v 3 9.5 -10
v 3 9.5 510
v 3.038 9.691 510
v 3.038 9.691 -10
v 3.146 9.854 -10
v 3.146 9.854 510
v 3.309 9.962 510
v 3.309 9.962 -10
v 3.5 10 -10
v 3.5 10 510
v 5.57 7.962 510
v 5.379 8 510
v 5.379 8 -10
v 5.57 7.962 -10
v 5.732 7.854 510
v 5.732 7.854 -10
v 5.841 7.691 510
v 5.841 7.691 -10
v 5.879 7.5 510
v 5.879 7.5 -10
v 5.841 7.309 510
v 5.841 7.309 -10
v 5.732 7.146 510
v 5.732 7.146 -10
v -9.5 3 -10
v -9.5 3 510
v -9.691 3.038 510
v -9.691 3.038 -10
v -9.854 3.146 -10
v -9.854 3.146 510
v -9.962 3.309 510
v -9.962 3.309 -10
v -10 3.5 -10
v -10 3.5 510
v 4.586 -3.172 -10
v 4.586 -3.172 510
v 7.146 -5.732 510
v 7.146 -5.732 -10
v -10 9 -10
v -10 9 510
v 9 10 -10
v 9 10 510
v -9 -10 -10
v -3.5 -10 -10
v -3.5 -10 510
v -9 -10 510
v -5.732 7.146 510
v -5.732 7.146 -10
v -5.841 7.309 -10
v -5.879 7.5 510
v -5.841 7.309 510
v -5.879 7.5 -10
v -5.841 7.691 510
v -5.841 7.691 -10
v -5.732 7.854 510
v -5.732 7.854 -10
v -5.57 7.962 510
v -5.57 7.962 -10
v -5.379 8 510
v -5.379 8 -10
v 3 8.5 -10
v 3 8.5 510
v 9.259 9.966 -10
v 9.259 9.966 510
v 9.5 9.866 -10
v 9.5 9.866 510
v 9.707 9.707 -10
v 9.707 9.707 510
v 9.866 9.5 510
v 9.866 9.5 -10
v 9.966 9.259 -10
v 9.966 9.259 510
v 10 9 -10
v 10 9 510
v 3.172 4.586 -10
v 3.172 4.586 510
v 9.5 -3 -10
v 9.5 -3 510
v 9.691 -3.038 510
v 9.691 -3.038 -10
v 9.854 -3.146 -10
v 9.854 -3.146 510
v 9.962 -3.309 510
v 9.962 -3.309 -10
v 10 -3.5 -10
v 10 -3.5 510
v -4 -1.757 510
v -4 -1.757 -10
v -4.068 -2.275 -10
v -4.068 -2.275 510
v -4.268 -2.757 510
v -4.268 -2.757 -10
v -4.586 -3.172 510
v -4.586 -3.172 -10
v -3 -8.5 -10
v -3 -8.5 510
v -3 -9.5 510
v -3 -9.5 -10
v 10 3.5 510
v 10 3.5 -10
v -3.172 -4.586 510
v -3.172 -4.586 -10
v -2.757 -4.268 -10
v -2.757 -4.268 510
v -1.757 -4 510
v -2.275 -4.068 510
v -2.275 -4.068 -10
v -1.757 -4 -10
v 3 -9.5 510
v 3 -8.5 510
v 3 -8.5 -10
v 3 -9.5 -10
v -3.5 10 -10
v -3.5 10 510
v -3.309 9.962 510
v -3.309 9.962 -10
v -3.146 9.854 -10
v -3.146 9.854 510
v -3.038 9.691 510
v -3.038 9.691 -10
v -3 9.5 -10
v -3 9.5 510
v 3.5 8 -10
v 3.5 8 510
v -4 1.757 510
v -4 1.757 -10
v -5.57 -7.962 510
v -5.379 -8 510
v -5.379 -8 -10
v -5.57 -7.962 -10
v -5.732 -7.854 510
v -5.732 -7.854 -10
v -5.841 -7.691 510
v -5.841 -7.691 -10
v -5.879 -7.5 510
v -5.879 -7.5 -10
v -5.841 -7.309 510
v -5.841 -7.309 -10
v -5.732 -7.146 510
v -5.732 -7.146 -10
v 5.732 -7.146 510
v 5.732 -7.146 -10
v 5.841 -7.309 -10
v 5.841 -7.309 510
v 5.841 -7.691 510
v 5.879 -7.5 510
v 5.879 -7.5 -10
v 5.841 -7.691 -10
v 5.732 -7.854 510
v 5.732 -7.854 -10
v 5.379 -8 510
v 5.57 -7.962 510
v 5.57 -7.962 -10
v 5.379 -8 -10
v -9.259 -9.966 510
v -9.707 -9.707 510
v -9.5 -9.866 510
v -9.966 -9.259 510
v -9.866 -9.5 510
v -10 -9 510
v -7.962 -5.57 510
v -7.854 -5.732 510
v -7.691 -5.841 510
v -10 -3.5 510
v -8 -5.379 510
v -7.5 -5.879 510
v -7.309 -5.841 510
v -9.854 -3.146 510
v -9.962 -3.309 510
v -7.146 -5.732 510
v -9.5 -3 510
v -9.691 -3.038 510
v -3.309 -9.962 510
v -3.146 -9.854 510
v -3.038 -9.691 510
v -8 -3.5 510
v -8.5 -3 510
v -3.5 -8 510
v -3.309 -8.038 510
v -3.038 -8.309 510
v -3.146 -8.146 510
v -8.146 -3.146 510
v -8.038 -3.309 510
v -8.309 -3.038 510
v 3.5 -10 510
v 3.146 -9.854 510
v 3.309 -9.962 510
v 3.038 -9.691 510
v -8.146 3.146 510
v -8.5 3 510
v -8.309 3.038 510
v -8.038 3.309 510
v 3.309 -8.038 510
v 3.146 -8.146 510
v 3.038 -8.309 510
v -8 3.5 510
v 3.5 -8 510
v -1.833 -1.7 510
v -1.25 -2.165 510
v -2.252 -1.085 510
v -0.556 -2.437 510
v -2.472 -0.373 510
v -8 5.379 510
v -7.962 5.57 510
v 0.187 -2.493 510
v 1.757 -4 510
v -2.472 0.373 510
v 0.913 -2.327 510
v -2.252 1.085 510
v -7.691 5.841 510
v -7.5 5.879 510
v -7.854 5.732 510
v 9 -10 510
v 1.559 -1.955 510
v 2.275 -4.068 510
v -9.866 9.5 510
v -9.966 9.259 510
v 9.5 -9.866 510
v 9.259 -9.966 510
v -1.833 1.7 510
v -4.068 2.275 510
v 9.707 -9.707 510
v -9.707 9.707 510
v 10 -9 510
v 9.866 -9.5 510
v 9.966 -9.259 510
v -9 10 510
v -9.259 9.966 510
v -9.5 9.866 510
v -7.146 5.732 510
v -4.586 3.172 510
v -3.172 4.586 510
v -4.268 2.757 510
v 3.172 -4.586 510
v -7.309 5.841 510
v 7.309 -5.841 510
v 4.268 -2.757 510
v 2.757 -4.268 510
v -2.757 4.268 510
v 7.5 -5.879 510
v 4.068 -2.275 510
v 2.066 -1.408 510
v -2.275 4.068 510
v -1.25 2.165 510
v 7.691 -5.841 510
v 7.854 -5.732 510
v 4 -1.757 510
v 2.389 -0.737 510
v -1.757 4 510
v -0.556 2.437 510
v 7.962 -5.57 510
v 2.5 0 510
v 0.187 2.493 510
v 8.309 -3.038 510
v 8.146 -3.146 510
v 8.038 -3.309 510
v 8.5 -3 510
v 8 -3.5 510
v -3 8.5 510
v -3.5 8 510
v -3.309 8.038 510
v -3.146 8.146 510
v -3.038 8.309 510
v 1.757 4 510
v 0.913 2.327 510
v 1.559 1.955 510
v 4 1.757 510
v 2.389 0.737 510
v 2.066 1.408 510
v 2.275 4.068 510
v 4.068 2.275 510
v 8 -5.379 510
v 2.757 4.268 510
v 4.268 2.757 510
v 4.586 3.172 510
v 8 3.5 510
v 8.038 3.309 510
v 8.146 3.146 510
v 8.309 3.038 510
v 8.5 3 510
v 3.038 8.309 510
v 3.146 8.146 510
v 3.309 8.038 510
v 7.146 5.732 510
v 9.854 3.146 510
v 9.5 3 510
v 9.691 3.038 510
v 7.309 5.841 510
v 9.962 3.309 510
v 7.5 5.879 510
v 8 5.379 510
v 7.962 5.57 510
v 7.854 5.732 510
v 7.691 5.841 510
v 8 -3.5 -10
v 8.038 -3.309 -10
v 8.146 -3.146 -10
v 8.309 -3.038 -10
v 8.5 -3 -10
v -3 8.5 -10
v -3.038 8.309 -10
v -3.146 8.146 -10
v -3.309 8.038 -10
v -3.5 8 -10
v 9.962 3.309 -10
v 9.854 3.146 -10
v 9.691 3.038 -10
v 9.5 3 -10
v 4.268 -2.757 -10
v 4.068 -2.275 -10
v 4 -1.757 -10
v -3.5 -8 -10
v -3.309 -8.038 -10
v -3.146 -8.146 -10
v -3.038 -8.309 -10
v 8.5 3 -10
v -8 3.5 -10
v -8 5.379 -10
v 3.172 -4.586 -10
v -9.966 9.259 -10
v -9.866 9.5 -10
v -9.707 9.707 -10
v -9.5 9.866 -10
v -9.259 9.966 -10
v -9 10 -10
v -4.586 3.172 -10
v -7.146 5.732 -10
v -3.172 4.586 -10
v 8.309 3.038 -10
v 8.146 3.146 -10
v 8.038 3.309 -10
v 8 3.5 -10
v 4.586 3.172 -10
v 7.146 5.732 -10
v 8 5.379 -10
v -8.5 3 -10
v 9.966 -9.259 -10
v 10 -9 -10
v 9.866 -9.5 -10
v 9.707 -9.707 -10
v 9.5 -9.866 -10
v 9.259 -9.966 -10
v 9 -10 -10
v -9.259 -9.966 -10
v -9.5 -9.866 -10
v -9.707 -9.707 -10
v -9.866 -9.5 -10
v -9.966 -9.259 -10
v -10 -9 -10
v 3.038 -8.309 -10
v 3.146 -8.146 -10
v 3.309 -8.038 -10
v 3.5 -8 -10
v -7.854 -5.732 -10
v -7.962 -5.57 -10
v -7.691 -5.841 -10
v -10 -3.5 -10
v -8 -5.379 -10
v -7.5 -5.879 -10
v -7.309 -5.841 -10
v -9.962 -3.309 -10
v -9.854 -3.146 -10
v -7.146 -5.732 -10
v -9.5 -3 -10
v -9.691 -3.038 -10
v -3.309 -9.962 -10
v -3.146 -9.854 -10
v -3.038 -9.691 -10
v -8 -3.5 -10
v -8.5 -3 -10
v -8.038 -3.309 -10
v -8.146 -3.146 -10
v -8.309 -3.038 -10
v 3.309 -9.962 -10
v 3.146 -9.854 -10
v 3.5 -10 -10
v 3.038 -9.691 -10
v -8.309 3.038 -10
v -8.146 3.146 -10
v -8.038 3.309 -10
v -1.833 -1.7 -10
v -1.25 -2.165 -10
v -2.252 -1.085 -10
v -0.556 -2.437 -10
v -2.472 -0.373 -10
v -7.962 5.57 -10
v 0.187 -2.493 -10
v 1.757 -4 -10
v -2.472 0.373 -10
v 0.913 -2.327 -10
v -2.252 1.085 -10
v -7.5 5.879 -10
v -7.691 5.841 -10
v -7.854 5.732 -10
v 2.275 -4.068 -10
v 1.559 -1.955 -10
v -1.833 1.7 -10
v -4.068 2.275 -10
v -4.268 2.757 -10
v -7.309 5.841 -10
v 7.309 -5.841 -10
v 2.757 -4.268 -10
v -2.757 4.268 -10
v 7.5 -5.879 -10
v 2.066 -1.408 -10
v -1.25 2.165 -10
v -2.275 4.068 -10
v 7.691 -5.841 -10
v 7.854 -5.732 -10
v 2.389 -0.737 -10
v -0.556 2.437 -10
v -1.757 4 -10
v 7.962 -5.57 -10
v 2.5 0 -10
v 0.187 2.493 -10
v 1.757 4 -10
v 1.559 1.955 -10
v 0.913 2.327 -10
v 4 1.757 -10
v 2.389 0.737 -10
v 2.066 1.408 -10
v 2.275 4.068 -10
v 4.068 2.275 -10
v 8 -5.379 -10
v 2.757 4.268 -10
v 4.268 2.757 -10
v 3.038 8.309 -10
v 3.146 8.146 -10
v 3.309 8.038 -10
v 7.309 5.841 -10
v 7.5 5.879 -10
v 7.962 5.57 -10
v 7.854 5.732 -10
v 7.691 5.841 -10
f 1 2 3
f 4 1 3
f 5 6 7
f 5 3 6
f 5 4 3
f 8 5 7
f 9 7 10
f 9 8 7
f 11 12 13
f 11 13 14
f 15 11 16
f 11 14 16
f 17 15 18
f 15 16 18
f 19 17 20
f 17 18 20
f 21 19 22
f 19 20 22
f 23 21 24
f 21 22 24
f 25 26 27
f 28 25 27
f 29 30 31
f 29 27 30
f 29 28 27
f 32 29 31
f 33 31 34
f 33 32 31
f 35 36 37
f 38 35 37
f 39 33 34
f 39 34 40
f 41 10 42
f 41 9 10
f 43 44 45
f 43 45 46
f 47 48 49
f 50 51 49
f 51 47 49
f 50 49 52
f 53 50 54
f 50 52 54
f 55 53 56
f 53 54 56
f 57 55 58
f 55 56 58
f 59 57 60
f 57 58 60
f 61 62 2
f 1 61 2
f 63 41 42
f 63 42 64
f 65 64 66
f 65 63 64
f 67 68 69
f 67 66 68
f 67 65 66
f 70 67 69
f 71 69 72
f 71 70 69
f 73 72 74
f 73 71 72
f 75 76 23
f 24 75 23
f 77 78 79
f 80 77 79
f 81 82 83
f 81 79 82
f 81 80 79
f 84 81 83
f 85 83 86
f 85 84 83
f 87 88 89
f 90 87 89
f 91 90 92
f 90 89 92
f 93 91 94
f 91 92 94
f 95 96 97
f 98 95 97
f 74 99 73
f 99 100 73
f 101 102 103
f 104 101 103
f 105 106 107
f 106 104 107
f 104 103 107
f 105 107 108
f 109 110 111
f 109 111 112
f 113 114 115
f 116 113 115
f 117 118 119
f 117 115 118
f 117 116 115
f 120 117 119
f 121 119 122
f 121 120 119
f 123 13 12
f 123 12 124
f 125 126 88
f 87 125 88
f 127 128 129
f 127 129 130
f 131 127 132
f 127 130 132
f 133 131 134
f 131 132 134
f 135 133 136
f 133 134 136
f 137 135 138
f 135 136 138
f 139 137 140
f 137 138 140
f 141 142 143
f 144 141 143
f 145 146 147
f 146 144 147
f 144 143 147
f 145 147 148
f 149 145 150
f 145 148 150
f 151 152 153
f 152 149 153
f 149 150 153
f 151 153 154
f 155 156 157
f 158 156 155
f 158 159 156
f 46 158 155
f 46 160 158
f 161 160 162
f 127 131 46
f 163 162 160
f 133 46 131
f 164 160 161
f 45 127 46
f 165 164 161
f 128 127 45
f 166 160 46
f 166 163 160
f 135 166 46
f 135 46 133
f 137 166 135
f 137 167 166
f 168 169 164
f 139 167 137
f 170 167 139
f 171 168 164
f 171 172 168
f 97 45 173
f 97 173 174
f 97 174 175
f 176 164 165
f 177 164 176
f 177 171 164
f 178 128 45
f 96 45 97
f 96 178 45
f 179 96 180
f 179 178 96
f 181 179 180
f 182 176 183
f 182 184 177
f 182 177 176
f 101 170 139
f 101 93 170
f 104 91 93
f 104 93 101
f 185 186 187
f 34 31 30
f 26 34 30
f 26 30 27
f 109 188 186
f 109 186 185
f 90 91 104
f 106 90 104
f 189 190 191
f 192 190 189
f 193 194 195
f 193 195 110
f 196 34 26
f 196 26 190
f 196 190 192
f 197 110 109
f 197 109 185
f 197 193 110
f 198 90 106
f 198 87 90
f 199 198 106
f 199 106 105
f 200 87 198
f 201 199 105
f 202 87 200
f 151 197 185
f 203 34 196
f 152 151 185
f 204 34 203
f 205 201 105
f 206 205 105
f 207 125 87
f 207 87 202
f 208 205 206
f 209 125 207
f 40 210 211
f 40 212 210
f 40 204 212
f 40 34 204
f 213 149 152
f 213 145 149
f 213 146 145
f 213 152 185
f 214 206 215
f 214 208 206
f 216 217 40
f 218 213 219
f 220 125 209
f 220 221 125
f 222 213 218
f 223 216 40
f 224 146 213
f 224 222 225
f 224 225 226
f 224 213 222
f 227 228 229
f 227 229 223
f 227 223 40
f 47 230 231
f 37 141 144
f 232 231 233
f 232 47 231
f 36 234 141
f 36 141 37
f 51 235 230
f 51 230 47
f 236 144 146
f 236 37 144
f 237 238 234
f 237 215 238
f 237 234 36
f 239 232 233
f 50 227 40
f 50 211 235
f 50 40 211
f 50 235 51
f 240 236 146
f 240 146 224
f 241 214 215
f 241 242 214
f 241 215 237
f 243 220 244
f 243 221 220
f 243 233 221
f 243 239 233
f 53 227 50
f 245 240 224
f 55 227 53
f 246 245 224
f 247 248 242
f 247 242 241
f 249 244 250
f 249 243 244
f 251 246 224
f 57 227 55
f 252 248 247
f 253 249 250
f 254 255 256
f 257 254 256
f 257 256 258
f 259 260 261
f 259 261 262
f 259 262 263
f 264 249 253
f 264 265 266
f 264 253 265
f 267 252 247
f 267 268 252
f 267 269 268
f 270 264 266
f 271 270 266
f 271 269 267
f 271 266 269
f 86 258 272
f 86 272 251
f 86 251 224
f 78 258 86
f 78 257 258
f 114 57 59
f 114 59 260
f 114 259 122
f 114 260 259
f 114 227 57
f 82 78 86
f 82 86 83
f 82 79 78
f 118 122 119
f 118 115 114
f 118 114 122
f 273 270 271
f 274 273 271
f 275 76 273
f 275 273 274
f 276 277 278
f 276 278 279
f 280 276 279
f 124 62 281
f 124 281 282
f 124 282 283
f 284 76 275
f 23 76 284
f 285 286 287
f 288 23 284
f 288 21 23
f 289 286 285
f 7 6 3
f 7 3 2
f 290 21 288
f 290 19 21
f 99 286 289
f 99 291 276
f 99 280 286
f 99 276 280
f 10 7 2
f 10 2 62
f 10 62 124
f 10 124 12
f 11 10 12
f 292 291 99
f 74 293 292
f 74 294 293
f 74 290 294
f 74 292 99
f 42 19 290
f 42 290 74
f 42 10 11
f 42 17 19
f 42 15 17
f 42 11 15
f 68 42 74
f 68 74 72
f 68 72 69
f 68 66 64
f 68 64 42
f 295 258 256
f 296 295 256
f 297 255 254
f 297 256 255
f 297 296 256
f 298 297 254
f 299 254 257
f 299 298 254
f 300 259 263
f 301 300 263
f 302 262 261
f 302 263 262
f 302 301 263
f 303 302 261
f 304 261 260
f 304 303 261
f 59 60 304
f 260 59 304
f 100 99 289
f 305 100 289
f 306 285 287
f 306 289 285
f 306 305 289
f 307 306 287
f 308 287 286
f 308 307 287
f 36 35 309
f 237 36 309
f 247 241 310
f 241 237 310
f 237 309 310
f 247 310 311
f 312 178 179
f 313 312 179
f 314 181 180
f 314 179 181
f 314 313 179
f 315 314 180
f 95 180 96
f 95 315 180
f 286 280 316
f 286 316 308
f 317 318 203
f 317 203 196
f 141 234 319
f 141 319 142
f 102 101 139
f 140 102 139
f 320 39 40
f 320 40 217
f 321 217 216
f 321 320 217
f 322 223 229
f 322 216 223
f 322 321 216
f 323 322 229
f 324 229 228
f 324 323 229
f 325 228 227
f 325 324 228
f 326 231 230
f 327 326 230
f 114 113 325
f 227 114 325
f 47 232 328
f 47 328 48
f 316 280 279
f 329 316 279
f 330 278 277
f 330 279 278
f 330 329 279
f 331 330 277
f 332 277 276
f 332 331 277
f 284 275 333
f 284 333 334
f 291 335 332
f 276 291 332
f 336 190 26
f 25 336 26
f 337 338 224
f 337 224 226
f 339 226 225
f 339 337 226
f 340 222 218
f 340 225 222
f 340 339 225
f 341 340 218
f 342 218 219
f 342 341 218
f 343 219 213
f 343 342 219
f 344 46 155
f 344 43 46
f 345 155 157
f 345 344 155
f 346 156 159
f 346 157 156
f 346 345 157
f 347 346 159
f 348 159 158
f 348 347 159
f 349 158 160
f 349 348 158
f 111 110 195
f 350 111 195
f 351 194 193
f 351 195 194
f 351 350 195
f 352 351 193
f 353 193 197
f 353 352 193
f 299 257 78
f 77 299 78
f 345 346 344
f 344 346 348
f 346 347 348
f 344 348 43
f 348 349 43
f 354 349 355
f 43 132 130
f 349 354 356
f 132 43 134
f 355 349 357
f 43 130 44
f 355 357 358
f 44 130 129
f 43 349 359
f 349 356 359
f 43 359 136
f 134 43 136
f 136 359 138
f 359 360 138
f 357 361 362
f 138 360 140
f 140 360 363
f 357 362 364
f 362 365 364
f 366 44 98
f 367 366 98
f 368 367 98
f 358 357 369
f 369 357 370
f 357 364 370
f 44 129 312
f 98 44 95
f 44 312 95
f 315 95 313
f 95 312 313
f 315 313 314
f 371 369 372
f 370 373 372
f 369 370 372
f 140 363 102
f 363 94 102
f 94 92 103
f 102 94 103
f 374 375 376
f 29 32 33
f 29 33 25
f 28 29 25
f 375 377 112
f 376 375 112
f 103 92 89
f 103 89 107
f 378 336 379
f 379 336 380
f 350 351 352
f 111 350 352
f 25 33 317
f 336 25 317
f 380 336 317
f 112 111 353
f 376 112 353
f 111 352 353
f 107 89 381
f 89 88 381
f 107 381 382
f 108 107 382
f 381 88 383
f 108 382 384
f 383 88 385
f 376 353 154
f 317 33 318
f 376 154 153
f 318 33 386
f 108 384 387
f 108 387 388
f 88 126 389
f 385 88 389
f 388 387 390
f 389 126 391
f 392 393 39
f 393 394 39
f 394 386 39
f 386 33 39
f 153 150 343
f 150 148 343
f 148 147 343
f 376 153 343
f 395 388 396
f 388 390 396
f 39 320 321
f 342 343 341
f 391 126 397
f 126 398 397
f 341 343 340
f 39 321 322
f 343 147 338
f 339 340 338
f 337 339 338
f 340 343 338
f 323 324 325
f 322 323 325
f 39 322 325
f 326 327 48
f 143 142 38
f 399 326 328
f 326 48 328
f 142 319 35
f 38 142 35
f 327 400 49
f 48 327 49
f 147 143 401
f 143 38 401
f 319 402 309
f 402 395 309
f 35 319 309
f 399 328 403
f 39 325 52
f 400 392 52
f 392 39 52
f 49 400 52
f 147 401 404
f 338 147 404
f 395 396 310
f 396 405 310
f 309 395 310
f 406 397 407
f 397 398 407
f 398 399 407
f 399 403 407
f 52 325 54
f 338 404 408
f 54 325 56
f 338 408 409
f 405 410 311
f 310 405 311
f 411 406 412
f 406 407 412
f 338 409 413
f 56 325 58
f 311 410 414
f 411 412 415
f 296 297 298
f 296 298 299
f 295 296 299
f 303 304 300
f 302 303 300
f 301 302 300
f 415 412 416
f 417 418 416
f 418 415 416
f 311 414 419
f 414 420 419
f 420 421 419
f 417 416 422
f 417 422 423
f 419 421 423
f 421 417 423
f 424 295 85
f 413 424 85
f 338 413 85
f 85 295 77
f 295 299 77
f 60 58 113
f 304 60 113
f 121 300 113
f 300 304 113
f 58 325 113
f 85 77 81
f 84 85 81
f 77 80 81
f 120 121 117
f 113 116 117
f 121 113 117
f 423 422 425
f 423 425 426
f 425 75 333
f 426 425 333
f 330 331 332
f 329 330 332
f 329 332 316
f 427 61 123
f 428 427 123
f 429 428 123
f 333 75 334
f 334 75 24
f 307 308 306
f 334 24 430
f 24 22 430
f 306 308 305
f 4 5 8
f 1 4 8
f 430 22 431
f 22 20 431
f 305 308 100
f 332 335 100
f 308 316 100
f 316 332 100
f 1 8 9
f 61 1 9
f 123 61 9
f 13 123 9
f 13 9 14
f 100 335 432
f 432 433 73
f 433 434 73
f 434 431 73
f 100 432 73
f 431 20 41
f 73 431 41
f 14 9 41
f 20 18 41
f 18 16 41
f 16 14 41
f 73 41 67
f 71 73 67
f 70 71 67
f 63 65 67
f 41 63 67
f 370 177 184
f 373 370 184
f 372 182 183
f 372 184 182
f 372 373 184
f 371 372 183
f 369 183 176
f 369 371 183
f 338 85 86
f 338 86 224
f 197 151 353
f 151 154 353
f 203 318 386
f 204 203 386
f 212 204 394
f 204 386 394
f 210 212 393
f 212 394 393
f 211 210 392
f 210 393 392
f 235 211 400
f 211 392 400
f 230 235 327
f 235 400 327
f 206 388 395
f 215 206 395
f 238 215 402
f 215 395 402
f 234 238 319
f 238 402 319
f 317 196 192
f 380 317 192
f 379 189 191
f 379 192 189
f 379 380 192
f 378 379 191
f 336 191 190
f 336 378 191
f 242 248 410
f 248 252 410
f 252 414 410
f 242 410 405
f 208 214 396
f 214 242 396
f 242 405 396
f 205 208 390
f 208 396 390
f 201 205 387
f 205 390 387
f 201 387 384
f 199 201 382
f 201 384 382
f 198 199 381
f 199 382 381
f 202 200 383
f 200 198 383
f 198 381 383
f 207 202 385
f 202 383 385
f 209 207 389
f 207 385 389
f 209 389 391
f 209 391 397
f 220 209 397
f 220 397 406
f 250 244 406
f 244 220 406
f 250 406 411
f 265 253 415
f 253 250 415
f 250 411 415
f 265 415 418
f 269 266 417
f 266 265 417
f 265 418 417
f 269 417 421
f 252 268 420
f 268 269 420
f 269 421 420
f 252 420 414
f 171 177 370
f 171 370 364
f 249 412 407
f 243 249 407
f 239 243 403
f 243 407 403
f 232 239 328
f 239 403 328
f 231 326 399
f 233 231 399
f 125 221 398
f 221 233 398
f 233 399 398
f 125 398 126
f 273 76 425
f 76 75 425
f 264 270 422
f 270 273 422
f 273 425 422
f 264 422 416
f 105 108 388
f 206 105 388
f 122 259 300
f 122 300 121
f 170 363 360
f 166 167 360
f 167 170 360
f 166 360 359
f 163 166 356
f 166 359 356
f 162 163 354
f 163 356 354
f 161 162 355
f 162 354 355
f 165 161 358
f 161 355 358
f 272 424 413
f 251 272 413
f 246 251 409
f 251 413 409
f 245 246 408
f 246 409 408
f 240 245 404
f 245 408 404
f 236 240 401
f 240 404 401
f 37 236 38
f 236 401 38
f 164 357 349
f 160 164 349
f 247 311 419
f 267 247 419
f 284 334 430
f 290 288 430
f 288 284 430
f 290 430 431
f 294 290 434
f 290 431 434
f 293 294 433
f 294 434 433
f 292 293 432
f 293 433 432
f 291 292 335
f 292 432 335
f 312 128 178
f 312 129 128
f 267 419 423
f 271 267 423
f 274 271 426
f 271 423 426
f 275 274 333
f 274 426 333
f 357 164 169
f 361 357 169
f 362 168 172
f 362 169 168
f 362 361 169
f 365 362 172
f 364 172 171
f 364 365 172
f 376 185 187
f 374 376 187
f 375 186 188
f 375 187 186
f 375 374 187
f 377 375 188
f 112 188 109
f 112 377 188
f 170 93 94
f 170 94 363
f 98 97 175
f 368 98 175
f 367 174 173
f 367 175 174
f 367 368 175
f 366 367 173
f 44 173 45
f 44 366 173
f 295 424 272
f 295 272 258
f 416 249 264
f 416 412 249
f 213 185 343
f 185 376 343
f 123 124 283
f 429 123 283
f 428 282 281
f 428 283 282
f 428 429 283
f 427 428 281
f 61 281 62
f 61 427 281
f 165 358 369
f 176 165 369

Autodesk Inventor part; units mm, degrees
ref_plane "Start Plane" through (0, 0, -10) normal (0, 0, 1) x (1, 0, 0)
ref_plane "End Plane" through (0, 0, 510) normal (0, 0, 1) x (1, 0, 0)
sketch "Sketch" plane through (0, 0, 0) normal (0, 0, 1) x (1, 0, 0)
  line L0 (0, 0) -> (2.5, 0) construction
  line L1 (0, 0) -> (0, 2.5) construction
  line L2 (0, 4) -> (0, -4) construction
  line L3 (0, 4) -> (1.7574, 4)
  arc A0 (1.7574, 4) -> (3.1716, 4.5858) centre (1.7574, 6) ccw
  line L4 (3.1716, 4.5858) -> (5.7322, 7.1464)
  line L5 (-4, 0) -> (4, 0) construction
  line L6 (4, 0) -> (4, 1.7574)
  arc A1 (4.5858, 3.1716) -> (4, 1.7574) centre (6, 1.7574) ccw
  line L7 (4.5858, 3.1716) -> (7.1464, 5.7322)
  line L8 (0, 0) -> (10, 10) construction
  line L9 (0, 0) -> (19.6827, 0) construction
  arc A2 (8, 5.3787) -> (7.1464, 5.7322) centre (7.5, 5.3787) ccw
  line L10 (8, 5.3787) -> (8, 3.5)
  arc A3 (8, 3.5) -> (8.5, 3) centre (8.5, 3.5) ccw
  line L11 (8.5, 3) -> (9.5, 3)
  arc A4 (9.5, 3) -> (10, 3.5) centre (9.5, 3.5) ccw
  line L12 (10, 3.5) -> (10, 9)
  line L13 (10, 9) -> (10, 10) construction
  arc A5 (5.7322, 7.1464) -> (5.3787, 8) centre (5.3787, 7.5) ccw
  line L14 (5.3787, 8) -> (3.5, 8)
  arc A6 (3, 8.5) -> (3.5, 8) centre (3.5, 8.5) ccw
  line L15 (3, 8.5) -> (3, 9.5)
  arc A7 (3.5, 10) -> (3, 9.5) centre (3.5, 9.5) ccw
  line L16 (3.5, 10) -> (9, 10)
  arc A8 (10, 9) -> (9, 10) centre (9, 9) ccw
  line L17 (0, 4) -> (-1.7574, 4)
  arc A9 (-3.1716, 4.5858) -> (-1.7574, 4) centre (-1.7574, 6) ccw
  line L18 (-3.1716, 4.5858) -> (-5.7322, 7.1464)
  line L19 (-4, 0) -> (-4, 1.7574)
  arc A10 (-4, 1.7574) -> (-4.5858, 3.1716) centre (-6, 1.7574) ccw
  line L20 (-4.5858, 3.1716) -> (-7.1464, 5.7322)
  arc A11 (-7.1464, 5.7322) -> (-8, 5.3787) centre (-7.5, 5.3787) ccw
  line L21 (-8, 5.3787) -> (-8, 3.5)
  arc A12 (-8.5, 3) -> (-8, 3.5) centre (-8.5, 3.5) ccw
  line L22 (-8.5, 3) -> (-9.5, 3)
  arc A13 (-10, 3.5) -> (-9.5, 3) centre (-9.5, 3.5) ccw
  line L23 (-10, 3.5) -> (-10, 9)
  arc A14 (-5.3787, 8) -> (-5.7322, 7.1464) centre (-5.3787, 7.5) ccw
  line L24 (-5.3787, 8) -> (-3.5, 8)
  arc A15 (-3.5, 8) -> (-3, 8.5) centre (-3.5, 8.5) ccw
  line L25 (-3, 8.5) -> (-3, 9.5)
  arc A16 (-3, 9.5) -> (-3.5, 10) centre (-3.5, 9.5) ccw
  line L26 (-3.5, 10) -> (-9, 10)
  arc A17 (-9, 10) -> (-10, 9) centre (-9, 9) ccw
  line L27 (0, -4) -> (-1.7574, -4)
  arc A18 (-1.7574, -4) -> (-3.1716, -4.5858) centre (-1.7574, -6) ccw
  line L28 (-3.1716, -4.5858) -> (-5.7322, -7.1464)
  arc A19 (-5.7322, -7.1464) -> (-5.3787, -8) centre (-5.3787, -7.5) ccw
  line L29 (-5.3787, -8) -> (-3.5, -8)
  arc A20 (-3, -8.5) -> (-3.5, -8) centre (-3.5, -8.5) ccw
  line L30 (-3, -8.5) -> (-3, -9.5)
  arc A21 (-3.5, -10) -> (-3, -9.5) centre (-3.5, -9.5) ccw
  line L31 (-3.5, -10) -> (-9, -10)
  arc A22 (-10, -9) -> (-9, -10) centre (-9, -9) ccw
  line L32 (-10, -3.5) -> (-10, -9)
  arc A23 (-9.5, -3) -> (-10, -3.5) centre (-9.5, -3.5) ccw
  line L33 (-8.5, -3) -> (-9.5, -3)
  arc A24 (-8, -3.5) -> (-8.5, -3) centre (-8.5, -3.5) ccw
  line L34 (-8, -5.3787) -> (-8, -3.5)
  arc A25 (-8, -5.3787) -> (-7.1464, -5.7322) centre (-7.5, -5.3787) ccw
  line L35 (-4.5858, -3.1716) -> (-7.1464, -5.7322)
  arc A26 (-4.5858, -3.1716) -> (-4, -1.7574) centre (-6, -1.7574) ccw
  line L36 (-4, 0) -> (-4, -1.7574)
  line L37 (3.5, -10) -> (9, -10)
  arc A27 (9, -10) -> (10, -9) centre (9, -9) ccw
  line L38 (10, -3.5) -> (10, -9)
  arc A28 (10, -3.5) -> (9.5, -3) centre (9.5, -3.5) ccw
  line L39 (8.5, -3) -> (9.5, -3)
  arc A29 (8.5, -3) -> (8, -3.5) centre (8.5, -3.5) ccw
  line L40 (8, -5.3787) -> (8, -3.5)
  arc A30 (7.1464, -5.7322) -> (8, -5.3787) centre (7.5, -5.3787) ccw
  line L41 (4.5858, -3.1716) -> (7.1464, -5.7322)
  arc A31 (4, -1.7574) -> (4.5858, -3.1716) centre (6, -1.7574) ccw
  line L42 (4, 0) -> (4, -1.7574)
  line L43 (5.3787, -8) -> (3.5, -8)
  arc A32 (5.3787, -8) -> (5.7322, -7.1464) centre (5.3787, -7.5) ccw
  line L44 (3.1716, -4.5858) -> (5.7322, -7.1464)
  arc A33 (3.1716, -4.5858) -> (1.7574, -4) centre (1.7574, -6) ccw
  line L45 (0, -4) -> (1.7574, -4)
  arc A34 (3.5, -8) -> (3, -8.5) centre (3.5, -8.5) ccw
  line L46 (3, -8.5) -> (3, -9.5)
  arc A35 (3, -9.5) -> (3.5, -10) centre (3.5, -9.5) ccw
  circle A36 centre (0, 0) radius 2.5
  dimension "d1" = 8
  dimension "d2" = 2
  dimension "d3" = 8
  dimension "d4" = 2
  dimension "d5" = 2
  dimension "d7" = 45
  dimension "d8" = 0.5
  dimension "d9" = 0.5
  dimension "d10" = 0.5
  dimension "d12" = 2
  dimension "d17" = 7
  dimension "d18" = 10
  dimension "d19" = 0.5
  dimension "d20" = 1
  dimension "d21" = 0.5
  dimension "d22" = 0.5
  dimension "d23" = 2
  dimension "d24" = 7
  dimension "d25" = 5
extrude "Body" add sketch "Sketch" along normal up to surface (520 mm away) from surface at -10
sketch "Sketch6" plane through (0, 0, 0) normal (0, 0, 1) x (1, 0, 0)
  line L0 (0, 0) -> (10, 0)
ref_plane "Work Plane5" through (0, 0, 0) normal (0, -1, 0) x (1, 0, 0)
sketch "Sketch7" plane through (0, 0, 0) normal (0, -1, 0) x (1, 0, 0)
  line L0 (-2, -10) -> (12, -10)
  line L1 (-2, 510) -> (12, 510)
  dimension "d33" = 520
ref_plane "Work Plane6" through (-139.969, 0, -10) normal (0, 0, -1) x (-1, 0, 0)
split "Split1" plane through (-139.969, 0, -10) removes the side toward (0, 0, -1)
ref_plane "Work Plane7" through (-10.031, 0, 510) normal (0, 0, 1) x (1, 0, 0)
split "Split2" plane through (-10.031, 0, 510) removes the side toward (0, 0, 1)
equation "\"d1\" = 8 * sigma"
equation "\"d2\" = 2 * sigma"
equation "\"d3\" = 8 * sigma"
equation "\"d4\" = 2 * sigma"
equation "\"d5\" = 2 * sigma"
equation "\"d8\" = 0.5 * sigma"
equation "\"d9\" = 0.5 * sigma"
equation "\"d10\" = 0.5 * sigma"
equation "\"d12\" = 2 * sigma"
equation "\"d17\" = 7 * sigma"
equation "\"d18\" = sigma"
equation "\"d19\" = 0.5 * sigma"
equation "\"d20\" = sigma"
equation "\"d21\" = 0.5 * sigma"
equation "\"d22\" = 0.5 * sigma"
equation "\"d23\" = 2 * sigma"
equation "\"d24\" = 7 * sigma"
equation "\"d25\" = 5 * sigma"
equation "\"sigma\" = 1"
equation "\"G_L\" = d33"
properties part number "A3.3-MEM"
